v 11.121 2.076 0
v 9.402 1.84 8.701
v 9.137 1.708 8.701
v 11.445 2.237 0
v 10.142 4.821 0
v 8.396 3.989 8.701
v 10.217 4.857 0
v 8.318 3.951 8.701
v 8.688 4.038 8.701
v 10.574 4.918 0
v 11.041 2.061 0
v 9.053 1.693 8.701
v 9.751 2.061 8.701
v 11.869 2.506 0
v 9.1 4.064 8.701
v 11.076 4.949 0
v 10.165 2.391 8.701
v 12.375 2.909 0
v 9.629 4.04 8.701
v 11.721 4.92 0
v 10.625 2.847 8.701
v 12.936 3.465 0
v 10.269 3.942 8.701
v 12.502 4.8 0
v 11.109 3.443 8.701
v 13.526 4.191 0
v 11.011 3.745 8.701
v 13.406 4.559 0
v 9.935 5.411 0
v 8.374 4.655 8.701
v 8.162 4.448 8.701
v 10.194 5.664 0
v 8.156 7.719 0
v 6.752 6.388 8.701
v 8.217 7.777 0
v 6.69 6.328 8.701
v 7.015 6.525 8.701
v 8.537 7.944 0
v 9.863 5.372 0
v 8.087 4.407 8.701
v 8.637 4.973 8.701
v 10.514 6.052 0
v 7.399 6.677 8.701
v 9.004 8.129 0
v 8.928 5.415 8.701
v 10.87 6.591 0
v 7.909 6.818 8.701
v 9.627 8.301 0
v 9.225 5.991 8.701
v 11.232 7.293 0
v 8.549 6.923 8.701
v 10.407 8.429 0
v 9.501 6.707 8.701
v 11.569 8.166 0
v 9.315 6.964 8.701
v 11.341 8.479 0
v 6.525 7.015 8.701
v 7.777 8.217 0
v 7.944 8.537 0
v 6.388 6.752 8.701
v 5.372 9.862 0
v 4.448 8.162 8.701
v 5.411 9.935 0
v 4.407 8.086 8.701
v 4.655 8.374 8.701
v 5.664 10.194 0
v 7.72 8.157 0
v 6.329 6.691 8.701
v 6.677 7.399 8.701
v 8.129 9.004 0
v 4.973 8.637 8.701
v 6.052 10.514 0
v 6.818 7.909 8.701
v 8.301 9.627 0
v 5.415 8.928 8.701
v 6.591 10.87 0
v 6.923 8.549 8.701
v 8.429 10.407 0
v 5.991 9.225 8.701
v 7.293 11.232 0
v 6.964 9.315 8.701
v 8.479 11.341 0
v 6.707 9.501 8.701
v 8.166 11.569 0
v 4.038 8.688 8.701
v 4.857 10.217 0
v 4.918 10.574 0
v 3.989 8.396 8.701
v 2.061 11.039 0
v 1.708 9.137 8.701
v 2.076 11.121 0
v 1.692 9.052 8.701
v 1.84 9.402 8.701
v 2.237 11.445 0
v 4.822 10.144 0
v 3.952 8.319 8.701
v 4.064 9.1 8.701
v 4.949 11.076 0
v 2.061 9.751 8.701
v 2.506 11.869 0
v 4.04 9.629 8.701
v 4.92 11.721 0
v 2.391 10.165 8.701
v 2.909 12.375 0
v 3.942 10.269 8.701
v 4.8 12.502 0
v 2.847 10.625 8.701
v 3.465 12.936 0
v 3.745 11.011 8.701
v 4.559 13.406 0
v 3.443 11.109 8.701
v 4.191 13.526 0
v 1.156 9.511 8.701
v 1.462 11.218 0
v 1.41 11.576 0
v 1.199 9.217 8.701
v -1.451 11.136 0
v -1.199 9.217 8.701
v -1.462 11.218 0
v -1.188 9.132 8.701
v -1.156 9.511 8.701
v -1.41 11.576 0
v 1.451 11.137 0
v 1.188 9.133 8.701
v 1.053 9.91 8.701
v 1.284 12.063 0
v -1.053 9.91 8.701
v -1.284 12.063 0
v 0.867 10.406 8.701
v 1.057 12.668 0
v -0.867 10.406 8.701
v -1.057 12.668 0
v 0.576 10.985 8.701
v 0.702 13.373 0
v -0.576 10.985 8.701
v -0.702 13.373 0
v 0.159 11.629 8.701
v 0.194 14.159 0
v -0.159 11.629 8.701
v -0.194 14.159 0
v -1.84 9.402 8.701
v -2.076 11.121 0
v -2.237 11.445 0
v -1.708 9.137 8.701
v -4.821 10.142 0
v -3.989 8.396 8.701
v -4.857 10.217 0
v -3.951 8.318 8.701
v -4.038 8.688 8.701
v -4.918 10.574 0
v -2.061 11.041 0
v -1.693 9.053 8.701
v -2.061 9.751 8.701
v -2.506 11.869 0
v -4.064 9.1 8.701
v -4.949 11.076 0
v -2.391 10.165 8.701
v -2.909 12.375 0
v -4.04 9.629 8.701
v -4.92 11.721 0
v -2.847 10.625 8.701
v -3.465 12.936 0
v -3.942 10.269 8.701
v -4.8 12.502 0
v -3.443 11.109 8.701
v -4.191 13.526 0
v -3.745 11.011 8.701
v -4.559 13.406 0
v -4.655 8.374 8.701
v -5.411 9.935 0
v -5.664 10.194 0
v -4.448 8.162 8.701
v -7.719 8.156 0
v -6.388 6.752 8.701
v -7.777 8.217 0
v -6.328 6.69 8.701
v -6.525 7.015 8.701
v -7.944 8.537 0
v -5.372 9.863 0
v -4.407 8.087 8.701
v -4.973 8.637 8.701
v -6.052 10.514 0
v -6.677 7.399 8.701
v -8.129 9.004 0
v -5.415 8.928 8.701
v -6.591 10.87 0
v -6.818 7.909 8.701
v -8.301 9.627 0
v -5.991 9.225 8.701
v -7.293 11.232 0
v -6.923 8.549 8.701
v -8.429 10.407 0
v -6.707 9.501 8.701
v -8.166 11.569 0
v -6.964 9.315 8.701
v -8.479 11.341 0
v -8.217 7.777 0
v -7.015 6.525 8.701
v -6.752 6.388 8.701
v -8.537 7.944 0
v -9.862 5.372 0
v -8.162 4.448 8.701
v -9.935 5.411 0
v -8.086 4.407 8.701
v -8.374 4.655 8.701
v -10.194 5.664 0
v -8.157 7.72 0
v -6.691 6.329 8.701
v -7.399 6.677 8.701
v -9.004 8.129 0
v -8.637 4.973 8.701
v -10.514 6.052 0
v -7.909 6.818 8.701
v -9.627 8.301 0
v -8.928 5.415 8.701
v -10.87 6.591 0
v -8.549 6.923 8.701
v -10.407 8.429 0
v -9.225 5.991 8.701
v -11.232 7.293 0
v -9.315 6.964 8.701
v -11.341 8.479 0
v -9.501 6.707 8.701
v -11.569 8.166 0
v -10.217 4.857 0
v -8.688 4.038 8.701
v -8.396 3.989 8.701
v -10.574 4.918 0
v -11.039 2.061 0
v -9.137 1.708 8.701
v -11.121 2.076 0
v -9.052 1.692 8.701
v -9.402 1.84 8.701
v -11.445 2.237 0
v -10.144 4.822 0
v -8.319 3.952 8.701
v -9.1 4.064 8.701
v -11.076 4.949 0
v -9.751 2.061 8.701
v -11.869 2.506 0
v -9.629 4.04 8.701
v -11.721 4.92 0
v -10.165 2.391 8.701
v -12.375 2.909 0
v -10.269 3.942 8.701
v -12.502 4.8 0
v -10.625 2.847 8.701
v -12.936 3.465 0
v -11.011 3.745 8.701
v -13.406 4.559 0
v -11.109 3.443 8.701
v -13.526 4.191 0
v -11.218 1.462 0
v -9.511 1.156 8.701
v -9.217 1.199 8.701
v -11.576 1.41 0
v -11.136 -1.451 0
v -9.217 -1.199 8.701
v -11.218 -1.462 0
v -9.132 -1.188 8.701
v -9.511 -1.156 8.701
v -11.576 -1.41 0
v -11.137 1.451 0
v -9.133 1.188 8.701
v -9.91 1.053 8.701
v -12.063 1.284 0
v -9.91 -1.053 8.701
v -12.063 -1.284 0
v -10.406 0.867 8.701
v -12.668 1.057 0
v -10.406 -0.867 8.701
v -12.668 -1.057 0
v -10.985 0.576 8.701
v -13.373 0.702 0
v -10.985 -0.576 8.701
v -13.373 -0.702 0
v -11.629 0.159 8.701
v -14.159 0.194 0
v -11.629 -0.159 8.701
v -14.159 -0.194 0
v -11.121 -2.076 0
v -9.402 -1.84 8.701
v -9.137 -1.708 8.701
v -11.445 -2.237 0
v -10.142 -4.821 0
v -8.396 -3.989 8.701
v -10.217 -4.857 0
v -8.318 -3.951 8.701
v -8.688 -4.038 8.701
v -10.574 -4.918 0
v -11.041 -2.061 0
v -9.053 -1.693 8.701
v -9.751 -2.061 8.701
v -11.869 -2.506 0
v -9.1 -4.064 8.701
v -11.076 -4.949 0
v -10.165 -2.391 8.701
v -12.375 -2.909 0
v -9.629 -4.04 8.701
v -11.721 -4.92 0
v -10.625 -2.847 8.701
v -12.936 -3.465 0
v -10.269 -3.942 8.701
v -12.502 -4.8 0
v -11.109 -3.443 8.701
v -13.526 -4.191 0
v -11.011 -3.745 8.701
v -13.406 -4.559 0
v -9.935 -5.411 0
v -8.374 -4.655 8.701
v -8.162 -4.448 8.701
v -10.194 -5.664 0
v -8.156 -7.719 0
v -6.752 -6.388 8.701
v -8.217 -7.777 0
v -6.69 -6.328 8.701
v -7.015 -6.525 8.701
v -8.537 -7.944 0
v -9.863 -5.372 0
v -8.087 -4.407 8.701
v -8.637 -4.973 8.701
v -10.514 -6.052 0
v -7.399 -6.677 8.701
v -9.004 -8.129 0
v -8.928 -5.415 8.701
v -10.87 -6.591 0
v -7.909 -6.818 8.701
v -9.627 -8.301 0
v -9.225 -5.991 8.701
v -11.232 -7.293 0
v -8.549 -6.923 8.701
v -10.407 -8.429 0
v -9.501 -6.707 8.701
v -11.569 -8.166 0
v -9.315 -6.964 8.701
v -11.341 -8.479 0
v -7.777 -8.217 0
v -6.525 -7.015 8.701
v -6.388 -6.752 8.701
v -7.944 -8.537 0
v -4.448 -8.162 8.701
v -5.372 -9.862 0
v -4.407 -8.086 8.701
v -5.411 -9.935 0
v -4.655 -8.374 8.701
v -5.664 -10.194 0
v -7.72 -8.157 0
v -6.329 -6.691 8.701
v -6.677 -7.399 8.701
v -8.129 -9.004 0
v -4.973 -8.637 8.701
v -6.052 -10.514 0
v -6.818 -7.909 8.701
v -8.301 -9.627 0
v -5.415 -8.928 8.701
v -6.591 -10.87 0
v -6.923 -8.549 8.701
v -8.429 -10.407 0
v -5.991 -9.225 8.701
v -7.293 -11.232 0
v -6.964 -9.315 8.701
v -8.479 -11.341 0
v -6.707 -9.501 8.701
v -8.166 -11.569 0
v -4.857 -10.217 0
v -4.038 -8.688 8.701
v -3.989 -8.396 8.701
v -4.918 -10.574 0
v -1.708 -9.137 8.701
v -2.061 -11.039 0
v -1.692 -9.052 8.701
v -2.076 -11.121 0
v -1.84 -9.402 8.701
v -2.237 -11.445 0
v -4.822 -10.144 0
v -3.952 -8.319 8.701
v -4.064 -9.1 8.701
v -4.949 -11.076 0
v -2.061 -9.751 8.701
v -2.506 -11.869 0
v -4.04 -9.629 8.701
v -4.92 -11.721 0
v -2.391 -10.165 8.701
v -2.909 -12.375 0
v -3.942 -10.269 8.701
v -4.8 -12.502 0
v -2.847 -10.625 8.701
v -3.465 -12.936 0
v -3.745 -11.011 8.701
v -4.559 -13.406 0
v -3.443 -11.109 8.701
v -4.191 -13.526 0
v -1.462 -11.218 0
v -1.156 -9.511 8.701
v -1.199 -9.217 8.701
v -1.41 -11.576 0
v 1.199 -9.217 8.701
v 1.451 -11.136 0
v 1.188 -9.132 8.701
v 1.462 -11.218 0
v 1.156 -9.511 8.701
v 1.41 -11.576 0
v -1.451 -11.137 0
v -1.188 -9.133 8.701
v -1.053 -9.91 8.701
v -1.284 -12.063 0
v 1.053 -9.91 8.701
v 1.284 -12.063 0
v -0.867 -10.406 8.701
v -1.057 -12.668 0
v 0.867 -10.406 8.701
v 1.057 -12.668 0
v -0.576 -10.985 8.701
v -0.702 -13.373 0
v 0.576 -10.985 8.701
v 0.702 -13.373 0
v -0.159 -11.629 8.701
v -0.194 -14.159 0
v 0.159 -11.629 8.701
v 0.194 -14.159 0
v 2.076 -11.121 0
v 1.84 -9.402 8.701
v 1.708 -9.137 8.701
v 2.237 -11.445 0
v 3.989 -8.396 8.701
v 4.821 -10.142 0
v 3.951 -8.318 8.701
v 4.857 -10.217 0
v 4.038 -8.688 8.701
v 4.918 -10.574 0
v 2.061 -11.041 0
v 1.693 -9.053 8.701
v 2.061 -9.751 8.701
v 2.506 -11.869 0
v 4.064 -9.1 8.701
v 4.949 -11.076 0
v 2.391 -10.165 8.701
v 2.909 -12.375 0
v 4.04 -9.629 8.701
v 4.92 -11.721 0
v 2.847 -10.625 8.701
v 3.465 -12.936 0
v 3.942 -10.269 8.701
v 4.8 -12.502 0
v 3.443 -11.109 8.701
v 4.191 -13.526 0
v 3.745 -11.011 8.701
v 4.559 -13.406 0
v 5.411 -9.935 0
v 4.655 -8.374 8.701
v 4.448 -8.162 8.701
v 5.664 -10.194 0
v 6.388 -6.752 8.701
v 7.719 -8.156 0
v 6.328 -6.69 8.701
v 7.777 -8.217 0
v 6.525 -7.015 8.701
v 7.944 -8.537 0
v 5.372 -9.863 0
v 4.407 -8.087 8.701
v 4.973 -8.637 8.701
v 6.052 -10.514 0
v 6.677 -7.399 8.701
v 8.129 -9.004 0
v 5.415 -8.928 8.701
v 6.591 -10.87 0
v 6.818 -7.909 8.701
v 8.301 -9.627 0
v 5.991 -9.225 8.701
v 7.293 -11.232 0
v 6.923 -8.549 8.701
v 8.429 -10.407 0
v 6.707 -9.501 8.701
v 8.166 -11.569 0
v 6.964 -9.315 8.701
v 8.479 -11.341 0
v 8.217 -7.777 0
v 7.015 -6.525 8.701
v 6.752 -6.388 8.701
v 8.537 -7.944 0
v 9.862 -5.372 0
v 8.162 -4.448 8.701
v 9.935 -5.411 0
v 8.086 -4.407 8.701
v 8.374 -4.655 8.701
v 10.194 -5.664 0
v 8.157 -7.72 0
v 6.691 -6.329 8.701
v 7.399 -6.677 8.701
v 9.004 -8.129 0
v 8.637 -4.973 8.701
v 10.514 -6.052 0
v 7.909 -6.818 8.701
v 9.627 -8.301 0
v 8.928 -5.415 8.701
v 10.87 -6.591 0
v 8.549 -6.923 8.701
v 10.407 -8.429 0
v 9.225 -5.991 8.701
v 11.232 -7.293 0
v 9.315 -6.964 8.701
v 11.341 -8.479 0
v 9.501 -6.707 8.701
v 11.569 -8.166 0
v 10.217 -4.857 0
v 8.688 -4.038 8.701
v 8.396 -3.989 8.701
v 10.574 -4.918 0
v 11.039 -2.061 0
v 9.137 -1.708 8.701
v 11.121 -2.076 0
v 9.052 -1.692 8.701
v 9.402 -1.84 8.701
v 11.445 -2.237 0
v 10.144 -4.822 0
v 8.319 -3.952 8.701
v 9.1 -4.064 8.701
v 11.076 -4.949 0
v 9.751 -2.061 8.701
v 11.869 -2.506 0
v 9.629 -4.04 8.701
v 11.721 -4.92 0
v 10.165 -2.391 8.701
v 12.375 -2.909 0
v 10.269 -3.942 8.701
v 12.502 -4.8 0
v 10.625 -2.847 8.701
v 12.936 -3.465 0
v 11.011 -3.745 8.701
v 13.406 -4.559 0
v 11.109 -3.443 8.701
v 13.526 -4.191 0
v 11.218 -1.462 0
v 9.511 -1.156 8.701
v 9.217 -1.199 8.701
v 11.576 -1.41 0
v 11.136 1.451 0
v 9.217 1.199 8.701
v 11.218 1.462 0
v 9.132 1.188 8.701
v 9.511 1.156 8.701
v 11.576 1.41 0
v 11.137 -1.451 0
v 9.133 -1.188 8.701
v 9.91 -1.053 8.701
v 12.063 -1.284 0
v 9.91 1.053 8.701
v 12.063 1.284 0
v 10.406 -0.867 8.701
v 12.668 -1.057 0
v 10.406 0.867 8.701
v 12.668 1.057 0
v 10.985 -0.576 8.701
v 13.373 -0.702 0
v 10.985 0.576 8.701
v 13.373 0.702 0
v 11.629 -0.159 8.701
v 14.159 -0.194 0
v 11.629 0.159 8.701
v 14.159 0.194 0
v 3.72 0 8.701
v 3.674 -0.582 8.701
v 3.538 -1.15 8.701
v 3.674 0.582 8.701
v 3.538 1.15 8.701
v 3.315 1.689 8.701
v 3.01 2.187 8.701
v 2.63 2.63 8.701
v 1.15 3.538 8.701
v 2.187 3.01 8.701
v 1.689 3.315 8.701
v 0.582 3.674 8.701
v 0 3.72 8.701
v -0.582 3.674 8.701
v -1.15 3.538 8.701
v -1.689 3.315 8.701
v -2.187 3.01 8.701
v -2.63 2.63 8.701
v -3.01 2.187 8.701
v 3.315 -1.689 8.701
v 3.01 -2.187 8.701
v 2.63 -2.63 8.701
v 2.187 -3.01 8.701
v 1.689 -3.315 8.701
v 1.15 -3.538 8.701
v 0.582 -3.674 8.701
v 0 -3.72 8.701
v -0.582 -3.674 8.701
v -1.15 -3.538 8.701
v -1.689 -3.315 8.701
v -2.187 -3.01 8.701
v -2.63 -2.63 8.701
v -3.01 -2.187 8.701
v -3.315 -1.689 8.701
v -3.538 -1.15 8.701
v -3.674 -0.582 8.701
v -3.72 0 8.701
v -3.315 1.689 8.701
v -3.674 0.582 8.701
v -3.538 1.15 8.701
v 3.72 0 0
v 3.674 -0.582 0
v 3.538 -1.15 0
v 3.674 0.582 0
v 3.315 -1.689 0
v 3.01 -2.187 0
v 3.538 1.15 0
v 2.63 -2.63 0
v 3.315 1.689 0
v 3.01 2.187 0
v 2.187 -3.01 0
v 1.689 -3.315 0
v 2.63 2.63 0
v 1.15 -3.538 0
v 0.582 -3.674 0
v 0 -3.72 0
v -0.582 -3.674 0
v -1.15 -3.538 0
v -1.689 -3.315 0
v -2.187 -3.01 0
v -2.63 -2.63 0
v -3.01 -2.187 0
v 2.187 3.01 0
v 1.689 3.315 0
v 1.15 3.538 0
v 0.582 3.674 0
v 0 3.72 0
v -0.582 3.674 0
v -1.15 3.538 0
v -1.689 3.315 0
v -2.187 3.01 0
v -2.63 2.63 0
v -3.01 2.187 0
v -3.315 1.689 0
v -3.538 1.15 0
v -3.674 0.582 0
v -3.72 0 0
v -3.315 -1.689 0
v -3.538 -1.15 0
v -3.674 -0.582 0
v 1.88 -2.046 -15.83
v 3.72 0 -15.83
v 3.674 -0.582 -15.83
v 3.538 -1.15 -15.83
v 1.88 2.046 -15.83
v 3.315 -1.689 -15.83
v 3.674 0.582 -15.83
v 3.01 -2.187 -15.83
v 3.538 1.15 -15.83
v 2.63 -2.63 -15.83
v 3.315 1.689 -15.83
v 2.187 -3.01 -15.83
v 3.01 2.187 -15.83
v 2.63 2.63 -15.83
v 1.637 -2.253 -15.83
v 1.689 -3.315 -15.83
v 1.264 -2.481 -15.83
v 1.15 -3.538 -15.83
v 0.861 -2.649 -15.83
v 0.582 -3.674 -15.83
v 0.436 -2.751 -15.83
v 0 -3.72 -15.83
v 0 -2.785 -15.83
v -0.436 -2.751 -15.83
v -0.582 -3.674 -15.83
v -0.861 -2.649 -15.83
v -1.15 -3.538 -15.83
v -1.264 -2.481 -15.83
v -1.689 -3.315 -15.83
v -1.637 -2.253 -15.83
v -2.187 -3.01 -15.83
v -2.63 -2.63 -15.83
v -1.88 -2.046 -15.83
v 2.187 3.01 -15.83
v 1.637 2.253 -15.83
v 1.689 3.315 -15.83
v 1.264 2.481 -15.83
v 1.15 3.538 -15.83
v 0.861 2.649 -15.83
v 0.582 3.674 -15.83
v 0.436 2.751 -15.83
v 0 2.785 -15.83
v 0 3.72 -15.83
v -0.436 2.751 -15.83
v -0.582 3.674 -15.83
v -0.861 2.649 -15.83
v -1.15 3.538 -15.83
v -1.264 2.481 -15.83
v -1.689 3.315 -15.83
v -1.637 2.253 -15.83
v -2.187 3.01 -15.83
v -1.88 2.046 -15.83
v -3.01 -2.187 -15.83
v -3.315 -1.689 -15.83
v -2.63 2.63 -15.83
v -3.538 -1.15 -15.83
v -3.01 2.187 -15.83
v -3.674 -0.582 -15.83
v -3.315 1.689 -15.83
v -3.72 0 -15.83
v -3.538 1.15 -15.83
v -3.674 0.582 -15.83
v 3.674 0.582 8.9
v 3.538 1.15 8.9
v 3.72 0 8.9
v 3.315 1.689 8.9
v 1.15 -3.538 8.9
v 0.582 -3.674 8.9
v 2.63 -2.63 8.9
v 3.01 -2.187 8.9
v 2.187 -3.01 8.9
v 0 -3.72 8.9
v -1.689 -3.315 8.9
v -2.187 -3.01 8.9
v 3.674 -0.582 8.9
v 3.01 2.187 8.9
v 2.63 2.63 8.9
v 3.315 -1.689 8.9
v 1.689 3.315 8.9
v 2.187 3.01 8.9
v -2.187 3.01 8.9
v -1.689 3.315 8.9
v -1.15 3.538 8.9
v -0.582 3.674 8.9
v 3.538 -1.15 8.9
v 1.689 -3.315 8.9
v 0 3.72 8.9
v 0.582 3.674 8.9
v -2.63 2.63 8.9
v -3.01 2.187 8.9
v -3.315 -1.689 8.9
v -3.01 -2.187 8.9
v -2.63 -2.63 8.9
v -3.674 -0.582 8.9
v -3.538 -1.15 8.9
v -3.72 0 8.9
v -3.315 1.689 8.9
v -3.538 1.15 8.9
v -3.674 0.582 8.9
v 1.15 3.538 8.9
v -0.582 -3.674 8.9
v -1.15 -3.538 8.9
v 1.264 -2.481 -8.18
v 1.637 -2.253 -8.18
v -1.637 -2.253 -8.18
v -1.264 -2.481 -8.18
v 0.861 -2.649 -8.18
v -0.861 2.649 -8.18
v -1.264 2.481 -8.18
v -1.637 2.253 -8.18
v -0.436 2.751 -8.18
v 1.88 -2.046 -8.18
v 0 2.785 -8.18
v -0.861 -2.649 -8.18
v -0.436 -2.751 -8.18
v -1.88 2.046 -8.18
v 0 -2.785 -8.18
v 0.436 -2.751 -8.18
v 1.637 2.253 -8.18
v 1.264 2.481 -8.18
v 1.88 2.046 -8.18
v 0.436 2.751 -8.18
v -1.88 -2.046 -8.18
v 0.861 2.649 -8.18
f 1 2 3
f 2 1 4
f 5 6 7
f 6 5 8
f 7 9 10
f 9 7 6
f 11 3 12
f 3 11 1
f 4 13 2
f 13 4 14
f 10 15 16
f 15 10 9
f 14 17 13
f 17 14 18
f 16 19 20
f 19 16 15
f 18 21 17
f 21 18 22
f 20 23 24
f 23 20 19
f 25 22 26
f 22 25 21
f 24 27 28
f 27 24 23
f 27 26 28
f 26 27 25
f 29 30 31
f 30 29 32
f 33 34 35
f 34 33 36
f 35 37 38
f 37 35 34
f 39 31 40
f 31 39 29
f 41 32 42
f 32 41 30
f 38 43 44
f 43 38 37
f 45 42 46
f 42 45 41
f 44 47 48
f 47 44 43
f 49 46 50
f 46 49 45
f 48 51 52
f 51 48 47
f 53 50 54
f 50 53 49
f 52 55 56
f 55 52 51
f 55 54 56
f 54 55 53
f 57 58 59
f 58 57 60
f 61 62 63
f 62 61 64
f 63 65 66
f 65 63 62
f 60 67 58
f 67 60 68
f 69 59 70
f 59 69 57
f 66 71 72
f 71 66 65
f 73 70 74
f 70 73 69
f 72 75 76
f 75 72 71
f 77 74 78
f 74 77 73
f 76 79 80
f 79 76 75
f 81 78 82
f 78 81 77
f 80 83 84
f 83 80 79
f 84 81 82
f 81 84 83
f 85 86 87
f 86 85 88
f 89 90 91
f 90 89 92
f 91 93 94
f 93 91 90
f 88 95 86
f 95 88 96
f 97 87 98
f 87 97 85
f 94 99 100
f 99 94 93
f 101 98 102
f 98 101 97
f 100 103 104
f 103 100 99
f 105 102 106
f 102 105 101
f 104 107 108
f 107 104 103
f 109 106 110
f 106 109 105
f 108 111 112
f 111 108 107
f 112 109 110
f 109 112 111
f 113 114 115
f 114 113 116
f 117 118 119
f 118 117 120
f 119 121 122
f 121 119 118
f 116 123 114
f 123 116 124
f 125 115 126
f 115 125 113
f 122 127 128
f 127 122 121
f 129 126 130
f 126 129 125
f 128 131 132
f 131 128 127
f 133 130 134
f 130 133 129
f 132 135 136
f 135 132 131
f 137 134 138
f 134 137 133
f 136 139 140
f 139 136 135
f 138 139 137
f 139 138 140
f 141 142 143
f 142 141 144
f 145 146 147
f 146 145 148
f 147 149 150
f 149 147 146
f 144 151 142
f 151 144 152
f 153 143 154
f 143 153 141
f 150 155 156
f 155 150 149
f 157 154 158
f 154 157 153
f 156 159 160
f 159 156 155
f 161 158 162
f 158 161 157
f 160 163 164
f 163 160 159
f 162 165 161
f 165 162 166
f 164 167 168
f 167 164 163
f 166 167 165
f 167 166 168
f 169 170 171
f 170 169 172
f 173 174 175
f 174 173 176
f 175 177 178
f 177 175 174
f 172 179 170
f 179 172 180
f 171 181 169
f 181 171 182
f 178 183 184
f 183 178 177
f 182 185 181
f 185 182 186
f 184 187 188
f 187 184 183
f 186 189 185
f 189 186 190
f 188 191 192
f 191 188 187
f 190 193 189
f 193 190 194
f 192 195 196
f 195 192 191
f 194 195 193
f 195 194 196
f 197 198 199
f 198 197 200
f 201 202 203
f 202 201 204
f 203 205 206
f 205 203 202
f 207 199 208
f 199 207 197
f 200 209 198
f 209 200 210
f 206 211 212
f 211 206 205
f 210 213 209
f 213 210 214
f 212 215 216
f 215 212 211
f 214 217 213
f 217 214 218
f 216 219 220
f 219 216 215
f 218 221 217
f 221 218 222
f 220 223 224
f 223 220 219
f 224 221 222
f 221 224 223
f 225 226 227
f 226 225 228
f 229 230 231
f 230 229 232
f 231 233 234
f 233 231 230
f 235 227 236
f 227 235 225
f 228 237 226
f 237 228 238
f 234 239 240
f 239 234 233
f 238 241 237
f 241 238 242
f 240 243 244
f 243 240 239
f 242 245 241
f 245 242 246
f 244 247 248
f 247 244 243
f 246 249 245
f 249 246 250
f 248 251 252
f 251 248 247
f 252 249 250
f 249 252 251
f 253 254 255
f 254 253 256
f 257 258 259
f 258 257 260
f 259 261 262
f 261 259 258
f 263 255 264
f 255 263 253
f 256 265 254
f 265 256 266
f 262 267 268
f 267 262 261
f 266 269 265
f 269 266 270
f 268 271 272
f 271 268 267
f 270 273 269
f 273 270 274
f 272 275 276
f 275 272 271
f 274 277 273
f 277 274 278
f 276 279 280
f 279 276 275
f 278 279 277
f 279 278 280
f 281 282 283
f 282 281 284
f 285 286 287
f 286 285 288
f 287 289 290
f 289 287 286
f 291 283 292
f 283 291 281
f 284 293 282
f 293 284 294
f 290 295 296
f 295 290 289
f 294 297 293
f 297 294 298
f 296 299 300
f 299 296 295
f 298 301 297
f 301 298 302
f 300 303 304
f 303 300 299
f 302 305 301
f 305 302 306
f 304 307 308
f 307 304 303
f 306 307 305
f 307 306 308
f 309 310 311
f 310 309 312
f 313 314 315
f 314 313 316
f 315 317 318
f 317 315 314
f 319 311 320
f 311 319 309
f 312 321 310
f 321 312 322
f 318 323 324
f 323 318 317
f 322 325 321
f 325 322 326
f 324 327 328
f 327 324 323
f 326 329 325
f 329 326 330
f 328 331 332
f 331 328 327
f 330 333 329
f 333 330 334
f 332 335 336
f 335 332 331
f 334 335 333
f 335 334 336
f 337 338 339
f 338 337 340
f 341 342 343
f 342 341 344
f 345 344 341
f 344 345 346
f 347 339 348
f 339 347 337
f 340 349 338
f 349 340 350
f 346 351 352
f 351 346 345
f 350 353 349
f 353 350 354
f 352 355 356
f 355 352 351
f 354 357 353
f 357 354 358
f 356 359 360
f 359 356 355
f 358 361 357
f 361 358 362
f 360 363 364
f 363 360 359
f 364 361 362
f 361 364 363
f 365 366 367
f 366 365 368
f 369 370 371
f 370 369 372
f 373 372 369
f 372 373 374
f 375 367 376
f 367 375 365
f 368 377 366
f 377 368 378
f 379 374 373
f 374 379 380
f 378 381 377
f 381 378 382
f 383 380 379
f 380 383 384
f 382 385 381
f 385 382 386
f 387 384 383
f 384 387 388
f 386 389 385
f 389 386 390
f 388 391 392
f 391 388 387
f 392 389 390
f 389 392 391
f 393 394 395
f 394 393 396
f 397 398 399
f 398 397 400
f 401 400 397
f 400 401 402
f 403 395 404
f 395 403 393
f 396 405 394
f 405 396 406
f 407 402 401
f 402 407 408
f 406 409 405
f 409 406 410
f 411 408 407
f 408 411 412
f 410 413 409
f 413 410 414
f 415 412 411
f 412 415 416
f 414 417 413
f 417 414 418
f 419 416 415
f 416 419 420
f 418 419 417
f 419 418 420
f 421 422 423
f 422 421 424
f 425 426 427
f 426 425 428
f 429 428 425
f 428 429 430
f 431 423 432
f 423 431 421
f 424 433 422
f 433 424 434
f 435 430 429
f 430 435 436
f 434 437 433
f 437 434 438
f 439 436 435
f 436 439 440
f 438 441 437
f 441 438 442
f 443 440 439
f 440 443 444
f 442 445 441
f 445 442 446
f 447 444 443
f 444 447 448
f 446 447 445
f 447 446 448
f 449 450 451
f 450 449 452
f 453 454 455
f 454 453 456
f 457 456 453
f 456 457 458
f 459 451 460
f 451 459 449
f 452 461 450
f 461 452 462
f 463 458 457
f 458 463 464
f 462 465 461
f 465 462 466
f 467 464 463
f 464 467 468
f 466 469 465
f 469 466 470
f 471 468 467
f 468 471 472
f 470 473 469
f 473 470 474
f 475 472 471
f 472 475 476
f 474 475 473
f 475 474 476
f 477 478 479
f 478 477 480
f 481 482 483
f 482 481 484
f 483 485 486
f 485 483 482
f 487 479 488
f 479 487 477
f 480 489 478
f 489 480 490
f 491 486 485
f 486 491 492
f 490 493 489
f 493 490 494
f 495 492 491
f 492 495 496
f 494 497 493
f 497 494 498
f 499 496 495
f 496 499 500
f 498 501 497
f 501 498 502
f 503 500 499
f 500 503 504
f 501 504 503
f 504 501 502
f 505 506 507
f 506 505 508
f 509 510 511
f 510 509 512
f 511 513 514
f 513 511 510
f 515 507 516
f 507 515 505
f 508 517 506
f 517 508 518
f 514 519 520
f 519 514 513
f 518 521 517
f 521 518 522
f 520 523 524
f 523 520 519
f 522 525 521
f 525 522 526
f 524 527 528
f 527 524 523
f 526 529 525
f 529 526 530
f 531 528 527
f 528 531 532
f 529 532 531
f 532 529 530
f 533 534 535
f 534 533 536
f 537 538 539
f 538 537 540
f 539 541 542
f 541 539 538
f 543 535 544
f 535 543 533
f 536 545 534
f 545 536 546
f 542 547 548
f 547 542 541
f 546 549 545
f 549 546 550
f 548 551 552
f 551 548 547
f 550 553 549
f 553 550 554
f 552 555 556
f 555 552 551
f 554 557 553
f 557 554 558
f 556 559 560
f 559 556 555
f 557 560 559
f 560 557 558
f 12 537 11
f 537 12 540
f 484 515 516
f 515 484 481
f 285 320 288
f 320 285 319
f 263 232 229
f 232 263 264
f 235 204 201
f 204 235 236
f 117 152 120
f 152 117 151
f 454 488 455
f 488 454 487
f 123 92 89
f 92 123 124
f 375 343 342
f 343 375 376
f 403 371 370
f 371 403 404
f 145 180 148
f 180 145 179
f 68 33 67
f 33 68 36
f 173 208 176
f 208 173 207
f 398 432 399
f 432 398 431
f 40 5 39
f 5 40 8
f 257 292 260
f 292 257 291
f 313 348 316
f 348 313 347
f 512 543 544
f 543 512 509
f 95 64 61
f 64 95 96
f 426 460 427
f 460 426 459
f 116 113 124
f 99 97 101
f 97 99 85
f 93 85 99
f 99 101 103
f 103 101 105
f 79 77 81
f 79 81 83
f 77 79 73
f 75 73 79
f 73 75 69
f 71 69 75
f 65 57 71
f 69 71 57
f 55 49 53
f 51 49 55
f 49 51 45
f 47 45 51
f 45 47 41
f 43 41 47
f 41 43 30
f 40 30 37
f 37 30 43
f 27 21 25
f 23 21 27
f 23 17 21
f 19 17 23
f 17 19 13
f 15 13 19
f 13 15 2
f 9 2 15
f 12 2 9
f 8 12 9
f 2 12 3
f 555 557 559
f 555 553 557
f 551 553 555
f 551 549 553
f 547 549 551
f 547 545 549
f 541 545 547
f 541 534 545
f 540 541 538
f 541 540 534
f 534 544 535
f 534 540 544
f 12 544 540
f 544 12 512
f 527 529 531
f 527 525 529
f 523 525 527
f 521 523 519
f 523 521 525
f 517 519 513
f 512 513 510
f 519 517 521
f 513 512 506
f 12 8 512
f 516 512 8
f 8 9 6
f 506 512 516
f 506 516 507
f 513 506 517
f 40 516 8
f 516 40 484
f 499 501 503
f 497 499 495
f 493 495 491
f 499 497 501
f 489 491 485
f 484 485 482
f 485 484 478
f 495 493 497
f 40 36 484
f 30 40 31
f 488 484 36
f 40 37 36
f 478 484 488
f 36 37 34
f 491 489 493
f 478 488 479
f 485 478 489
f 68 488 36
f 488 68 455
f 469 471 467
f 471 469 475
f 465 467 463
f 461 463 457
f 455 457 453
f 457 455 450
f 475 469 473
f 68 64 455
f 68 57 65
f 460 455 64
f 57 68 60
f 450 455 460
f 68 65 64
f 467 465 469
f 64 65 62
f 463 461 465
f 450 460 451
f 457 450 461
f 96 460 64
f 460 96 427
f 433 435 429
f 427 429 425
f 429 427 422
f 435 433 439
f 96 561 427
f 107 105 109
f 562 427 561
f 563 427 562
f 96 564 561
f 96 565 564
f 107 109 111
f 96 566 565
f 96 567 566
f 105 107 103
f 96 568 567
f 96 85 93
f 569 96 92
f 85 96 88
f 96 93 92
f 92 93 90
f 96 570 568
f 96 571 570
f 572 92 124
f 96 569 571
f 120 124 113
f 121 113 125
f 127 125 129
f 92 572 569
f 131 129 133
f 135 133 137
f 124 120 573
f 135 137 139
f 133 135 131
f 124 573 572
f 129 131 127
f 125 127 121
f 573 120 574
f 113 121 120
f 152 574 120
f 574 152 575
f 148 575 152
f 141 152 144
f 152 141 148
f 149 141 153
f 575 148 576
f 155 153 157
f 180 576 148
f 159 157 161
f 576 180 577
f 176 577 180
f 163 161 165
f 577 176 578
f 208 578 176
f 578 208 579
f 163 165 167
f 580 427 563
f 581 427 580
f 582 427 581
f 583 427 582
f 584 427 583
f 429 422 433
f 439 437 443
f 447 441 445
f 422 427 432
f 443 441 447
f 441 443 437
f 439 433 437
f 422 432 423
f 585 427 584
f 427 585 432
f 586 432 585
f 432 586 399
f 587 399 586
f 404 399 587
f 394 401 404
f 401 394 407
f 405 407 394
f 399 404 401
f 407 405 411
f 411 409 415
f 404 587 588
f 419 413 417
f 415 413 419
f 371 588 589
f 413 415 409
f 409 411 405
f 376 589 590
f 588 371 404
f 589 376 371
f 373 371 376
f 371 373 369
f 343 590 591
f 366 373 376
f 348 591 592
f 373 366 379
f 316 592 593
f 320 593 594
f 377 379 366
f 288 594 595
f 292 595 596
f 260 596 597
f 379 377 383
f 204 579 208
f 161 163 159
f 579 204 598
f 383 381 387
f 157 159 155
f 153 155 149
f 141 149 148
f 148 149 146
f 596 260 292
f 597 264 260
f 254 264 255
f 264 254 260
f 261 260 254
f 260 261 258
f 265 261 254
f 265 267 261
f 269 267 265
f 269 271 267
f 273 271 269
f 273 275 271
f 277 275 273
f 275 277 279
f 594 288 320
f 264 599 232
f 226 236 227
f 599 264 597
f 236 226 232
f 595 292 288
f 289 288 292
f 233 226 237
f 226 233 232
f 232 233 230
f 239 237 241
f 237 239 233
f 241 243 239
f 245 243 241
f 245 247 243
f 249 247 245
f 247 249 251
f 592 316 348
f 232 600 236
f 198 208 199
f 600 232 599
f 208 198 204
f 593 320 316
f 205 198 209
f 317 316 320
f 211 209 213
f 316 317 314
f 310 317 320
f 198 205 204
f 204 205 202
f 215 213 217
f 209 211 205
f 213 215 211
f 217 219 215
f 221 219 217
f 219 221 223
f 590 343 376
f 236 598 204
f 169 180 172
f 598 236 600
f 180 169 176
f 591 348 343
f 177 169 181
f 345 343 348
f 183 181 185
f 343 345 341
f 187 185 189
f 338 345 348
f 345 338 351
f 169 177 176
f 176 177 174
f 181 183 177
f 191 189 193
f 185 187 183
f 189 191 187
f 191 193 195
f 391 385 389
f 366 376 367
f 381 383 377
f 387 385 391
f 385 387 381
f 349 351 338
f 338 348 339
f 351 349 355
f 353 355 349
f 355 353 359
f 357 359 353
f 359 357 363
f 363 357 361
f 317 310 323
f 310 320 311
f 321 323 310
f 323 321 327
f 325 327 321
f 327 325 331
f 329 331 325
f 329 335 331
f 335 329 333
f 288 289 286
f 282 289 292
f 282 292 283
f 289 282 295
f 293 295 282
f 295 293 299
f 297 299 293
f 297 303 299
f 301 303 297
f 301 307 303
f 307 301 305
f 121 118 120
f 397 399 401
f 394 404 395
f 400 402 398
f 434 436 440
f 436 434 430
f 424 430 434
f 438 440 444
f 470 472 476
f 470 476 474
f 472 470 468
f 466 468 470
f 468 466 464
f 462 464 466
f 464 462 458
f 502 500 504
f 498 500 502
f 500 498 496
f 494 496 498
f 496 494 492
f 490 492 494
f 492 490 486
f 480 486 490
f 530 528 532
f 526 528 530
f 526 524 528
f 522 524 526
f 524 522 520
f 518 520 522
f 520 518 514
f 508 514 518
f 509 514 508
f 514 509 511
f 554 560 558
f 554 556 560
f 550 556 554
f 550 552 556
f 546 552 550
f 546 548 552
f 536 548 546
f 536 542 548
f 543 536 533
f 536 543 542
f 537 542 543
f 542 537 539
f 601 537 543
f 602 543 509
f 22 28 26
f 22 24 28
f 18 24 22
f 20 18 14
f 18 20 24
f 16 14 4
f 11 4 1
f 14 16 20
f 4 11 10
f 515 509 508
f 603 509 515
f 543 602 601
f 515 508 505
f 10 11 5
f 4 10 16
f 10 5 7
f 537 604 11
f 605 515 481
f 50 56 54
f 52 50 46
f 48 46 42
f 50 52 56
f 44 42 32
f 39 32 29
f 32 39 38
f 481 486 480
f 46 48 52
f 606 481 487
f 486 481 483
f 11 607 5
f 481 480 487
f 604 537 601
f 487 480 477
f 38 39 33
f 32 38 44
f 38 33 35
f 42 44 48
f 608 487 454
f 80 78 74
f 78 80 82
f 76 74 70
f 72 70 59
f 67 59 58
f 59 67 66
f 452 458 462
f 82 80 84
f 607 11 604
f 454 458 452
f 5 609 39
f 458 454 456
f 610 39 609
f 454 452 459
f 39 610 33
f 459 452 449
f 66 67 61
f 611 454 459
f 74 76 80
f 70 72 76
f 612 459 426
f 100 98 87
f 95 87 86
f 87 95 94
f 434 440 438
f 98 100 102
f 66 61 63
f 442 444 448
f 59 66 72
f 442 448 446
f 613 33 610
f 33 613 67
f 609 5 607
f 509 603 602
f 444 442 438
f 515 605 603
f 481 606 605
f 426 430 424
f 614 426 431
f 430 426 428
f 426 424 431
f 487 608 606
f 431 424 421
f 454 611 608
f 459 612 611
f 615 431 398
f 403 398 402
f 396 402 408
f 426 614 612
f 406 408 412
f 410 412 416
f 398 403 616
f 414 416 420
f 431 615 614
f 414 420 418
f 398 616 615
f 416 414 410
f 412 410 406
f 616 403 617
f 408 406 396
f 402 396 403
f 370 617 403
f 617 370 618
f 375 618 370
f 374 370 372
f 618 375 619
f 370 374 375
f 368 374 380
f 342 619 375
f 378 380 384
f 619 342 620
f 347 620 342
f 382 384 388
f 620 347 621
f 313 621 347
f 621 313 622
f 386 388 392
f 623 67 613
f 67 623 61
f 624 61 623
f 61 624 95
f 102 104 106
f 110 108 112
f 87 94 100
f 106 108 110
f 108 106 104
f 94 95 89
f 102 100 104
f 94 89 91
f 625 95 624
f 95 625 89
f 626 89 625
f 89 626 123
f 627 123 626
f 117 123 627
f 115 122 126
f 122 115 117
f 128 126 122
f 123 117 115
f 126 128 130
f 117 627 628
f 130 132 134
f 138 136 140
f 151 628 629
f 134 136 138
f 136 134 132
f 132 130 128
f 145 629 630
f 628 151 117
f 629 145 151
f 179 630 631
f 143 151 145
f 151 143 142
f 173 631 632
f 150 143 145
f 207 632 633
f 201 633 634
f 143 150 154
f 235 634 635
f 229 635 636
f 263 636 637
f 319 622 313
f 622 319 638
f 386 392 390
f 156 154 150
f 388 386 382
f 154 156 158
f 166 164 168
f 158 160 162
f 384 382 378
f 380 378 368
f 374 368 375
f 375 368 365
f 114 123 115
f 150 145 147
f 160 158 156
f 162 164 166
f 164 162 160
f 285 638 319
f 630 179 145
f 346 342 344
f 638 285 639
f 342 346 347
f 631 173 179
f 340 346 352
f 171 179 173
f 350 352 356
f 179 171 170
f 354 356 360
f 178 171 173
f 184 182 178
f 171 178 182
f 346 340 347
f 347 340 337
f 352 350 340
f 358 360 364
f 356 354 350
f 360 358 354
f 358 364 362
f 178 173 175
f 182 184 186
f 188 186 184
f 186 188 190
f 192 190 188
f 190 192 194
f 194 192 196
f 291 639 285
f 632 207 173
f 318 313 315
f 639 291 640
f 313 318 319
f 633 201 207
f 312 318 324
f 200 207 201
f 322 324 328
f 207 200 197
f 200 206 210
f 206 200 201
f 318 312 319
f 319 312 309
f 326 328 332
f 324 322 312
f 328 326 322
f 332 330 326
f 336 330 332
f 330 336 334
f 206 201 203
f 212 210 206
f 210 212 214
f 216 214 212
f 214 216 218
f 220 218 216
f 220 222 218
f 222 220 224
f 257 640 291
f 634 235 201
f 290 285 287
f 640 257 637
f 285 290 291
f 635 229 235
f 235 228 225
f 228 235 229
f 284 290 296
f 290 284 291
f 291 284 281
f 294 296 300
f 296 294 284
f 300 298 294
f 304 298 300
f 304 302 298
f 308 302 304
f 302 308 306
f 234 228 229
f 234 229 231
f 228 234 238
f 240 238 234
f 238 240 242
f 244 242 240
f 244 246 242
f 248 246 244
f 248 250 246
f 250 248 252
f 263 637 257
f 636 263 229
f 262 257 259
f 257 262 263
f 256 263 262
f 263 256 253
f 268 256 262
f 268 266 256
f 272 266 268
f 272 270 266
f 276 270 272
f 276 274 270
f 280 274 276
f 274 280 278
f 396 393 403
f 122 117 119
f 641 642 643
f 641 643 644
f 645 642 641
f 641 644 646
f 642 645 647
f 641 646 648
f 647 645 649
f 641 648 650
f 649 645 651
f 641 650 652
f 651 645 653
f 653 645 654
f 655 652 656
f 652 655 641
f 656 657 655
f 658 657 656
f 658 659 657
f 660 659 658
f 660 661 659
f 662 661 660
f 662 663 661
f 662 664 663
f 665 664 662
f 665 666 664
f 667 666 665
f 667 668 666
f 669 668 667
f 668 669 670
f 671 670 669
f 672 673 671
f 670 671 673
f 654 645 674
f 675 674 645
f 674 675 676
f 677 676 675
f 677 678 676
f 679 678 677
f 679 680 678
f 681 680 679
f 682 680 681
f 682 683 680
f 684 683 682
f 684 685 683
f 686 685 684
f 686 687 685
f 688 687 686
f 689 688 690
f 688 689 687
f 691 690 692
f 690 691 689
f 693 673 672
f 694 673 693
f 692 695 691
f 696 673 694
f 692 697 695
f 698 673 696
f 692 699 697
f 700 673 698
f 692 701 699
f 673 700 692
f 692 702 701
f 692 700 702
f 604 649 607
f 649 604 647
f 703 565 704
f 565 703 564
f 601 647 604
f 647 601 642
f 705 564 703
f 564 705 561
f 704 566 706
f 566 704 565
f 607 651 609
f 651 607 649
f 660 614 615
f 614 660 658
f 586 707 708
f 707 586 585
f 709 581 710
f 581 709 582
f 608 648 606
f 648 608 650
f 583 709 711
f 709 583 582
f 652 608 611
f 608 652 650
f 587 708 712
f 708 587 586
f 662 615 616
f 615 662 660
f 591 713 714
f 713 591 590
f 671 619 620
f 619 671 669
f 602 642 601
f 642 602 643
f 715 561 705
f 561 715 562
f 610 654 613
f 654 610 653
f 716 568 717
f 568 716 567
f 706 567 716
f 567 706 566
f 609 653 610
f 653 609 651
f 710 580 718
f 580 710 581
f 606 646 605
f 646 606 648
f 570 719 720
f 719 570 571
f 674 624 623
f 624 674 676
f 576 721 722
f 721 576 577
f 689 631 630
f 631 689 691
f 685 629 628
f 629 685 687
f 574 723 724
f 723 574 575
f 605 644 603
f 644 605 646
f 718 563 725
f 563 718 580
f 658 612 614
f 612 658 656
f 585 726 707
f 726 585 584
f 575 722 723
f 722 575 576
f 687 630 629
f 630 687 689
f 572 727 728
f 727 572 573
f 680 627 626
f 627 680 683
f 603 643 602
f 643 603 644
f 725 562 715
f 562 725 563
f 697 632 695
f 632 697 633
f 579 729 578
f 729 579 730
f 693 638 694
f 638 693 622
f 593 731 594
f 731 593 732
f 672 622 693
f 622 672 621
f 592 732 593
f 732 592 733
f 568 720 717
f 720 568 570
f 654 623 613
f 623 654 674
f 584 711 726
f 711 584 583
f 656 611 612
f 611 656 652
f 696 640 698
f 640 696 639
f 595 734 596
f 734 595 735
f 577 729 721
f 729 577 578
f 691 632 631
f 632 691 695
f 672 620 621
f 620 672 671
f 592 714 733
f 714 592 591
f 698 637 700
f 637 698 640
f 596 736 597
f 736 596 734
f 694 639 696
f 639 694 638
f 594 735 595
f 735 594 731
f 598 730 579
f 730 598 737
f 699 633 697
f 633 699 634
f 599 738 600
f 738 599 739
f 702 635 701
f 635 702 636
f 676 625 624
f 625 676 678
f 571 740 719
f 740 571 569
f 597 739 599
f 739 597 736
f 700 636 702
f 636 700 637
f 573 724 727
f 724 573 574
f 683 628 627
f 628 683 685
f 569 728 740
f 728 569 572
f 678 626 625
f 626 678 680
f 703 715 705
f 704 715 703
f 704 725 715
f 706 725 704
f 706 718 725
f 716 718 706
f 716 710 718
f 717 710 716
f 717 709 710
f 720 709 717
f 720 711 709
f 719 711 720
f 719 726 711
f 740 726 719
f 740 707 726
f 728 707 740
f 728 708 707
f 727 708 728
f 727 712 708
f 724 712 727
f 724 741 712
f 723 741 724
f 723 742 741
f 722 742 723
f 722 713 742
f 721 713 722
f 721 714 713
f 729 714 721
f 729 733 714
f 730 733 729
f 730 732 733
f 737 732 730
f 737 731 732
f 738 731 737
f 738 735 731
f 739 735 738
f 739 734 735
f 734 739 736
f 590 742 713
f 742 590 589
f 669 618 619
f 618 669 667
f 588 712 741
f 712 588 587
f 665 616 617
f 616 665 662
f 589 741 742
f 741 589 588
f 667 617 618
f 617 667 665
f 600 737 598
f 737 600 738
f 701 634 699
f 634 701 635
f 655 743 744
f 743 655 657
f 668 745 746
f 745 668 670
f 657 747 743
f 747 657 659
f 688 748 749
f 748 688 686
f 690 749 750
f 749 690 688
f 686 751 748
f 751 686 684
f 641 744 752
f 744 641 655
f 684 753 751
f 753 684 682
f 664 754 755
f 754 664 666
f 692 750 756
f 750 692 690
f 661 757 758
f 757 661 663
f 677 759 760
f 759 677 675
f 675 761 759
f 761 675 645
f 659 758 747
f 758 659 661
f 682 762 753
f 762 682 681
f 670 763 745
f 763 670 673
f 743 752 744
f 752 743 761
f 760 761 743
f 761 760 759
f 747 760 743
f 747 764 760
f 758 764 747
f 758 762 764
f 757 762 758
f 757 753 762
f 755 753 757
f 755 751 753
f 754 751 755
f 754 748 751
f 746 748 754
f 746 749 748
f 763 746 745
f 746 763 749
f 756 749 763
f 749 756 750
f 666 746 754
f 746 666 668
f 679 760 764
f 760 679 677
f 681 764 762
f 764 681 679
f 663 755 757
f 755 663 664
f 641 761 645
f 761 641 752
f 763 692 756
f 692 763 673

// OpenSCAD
use <MCAD/involute_gears.scad>

tol = 0.1;

target_rad = 6.2;
inner_diam = 5.37;
chord_dist = 3.66;

length = 20.73 + 4;
cog_t = 9;
pitch = 230;
cog_r =  13;
cog_teeth = round(cog_r * 360/pitch);

fix_depth = 7.65;

difference(){
    union(){
    bevel_gear (
        number_of_teeth=cog_teeth, 
        cone_distance=50, 
        face_width=cog_t, 
        outside_circular_pitch=pitch, 
        pressure_angle=30,
        clearance = 0.2, 
        bore_diameter=0,
        gear_thickness = 2, 
        backlash = 0, 
        involute_facets=0, 
        finish = -1);
    join_r = target_rad * 0.6;
    translate([0, 0, cog_t - length - tol]) cylinder(length, r1 = join_r, r2 = join_r, $fn=40);
    }
    translate([0, 0, cog_t - length - tol])
    intersection(){
        cylinder(fix_depth, r1 = inner_diam/2 + tol, r2 = inner_diam/2 + tol, $fn=40);
        translate([0, 0, fix_depth/2]) cube([chord_dist + tol, inner_diam + 2*tol, fix_depth], center=true);
    }
}
